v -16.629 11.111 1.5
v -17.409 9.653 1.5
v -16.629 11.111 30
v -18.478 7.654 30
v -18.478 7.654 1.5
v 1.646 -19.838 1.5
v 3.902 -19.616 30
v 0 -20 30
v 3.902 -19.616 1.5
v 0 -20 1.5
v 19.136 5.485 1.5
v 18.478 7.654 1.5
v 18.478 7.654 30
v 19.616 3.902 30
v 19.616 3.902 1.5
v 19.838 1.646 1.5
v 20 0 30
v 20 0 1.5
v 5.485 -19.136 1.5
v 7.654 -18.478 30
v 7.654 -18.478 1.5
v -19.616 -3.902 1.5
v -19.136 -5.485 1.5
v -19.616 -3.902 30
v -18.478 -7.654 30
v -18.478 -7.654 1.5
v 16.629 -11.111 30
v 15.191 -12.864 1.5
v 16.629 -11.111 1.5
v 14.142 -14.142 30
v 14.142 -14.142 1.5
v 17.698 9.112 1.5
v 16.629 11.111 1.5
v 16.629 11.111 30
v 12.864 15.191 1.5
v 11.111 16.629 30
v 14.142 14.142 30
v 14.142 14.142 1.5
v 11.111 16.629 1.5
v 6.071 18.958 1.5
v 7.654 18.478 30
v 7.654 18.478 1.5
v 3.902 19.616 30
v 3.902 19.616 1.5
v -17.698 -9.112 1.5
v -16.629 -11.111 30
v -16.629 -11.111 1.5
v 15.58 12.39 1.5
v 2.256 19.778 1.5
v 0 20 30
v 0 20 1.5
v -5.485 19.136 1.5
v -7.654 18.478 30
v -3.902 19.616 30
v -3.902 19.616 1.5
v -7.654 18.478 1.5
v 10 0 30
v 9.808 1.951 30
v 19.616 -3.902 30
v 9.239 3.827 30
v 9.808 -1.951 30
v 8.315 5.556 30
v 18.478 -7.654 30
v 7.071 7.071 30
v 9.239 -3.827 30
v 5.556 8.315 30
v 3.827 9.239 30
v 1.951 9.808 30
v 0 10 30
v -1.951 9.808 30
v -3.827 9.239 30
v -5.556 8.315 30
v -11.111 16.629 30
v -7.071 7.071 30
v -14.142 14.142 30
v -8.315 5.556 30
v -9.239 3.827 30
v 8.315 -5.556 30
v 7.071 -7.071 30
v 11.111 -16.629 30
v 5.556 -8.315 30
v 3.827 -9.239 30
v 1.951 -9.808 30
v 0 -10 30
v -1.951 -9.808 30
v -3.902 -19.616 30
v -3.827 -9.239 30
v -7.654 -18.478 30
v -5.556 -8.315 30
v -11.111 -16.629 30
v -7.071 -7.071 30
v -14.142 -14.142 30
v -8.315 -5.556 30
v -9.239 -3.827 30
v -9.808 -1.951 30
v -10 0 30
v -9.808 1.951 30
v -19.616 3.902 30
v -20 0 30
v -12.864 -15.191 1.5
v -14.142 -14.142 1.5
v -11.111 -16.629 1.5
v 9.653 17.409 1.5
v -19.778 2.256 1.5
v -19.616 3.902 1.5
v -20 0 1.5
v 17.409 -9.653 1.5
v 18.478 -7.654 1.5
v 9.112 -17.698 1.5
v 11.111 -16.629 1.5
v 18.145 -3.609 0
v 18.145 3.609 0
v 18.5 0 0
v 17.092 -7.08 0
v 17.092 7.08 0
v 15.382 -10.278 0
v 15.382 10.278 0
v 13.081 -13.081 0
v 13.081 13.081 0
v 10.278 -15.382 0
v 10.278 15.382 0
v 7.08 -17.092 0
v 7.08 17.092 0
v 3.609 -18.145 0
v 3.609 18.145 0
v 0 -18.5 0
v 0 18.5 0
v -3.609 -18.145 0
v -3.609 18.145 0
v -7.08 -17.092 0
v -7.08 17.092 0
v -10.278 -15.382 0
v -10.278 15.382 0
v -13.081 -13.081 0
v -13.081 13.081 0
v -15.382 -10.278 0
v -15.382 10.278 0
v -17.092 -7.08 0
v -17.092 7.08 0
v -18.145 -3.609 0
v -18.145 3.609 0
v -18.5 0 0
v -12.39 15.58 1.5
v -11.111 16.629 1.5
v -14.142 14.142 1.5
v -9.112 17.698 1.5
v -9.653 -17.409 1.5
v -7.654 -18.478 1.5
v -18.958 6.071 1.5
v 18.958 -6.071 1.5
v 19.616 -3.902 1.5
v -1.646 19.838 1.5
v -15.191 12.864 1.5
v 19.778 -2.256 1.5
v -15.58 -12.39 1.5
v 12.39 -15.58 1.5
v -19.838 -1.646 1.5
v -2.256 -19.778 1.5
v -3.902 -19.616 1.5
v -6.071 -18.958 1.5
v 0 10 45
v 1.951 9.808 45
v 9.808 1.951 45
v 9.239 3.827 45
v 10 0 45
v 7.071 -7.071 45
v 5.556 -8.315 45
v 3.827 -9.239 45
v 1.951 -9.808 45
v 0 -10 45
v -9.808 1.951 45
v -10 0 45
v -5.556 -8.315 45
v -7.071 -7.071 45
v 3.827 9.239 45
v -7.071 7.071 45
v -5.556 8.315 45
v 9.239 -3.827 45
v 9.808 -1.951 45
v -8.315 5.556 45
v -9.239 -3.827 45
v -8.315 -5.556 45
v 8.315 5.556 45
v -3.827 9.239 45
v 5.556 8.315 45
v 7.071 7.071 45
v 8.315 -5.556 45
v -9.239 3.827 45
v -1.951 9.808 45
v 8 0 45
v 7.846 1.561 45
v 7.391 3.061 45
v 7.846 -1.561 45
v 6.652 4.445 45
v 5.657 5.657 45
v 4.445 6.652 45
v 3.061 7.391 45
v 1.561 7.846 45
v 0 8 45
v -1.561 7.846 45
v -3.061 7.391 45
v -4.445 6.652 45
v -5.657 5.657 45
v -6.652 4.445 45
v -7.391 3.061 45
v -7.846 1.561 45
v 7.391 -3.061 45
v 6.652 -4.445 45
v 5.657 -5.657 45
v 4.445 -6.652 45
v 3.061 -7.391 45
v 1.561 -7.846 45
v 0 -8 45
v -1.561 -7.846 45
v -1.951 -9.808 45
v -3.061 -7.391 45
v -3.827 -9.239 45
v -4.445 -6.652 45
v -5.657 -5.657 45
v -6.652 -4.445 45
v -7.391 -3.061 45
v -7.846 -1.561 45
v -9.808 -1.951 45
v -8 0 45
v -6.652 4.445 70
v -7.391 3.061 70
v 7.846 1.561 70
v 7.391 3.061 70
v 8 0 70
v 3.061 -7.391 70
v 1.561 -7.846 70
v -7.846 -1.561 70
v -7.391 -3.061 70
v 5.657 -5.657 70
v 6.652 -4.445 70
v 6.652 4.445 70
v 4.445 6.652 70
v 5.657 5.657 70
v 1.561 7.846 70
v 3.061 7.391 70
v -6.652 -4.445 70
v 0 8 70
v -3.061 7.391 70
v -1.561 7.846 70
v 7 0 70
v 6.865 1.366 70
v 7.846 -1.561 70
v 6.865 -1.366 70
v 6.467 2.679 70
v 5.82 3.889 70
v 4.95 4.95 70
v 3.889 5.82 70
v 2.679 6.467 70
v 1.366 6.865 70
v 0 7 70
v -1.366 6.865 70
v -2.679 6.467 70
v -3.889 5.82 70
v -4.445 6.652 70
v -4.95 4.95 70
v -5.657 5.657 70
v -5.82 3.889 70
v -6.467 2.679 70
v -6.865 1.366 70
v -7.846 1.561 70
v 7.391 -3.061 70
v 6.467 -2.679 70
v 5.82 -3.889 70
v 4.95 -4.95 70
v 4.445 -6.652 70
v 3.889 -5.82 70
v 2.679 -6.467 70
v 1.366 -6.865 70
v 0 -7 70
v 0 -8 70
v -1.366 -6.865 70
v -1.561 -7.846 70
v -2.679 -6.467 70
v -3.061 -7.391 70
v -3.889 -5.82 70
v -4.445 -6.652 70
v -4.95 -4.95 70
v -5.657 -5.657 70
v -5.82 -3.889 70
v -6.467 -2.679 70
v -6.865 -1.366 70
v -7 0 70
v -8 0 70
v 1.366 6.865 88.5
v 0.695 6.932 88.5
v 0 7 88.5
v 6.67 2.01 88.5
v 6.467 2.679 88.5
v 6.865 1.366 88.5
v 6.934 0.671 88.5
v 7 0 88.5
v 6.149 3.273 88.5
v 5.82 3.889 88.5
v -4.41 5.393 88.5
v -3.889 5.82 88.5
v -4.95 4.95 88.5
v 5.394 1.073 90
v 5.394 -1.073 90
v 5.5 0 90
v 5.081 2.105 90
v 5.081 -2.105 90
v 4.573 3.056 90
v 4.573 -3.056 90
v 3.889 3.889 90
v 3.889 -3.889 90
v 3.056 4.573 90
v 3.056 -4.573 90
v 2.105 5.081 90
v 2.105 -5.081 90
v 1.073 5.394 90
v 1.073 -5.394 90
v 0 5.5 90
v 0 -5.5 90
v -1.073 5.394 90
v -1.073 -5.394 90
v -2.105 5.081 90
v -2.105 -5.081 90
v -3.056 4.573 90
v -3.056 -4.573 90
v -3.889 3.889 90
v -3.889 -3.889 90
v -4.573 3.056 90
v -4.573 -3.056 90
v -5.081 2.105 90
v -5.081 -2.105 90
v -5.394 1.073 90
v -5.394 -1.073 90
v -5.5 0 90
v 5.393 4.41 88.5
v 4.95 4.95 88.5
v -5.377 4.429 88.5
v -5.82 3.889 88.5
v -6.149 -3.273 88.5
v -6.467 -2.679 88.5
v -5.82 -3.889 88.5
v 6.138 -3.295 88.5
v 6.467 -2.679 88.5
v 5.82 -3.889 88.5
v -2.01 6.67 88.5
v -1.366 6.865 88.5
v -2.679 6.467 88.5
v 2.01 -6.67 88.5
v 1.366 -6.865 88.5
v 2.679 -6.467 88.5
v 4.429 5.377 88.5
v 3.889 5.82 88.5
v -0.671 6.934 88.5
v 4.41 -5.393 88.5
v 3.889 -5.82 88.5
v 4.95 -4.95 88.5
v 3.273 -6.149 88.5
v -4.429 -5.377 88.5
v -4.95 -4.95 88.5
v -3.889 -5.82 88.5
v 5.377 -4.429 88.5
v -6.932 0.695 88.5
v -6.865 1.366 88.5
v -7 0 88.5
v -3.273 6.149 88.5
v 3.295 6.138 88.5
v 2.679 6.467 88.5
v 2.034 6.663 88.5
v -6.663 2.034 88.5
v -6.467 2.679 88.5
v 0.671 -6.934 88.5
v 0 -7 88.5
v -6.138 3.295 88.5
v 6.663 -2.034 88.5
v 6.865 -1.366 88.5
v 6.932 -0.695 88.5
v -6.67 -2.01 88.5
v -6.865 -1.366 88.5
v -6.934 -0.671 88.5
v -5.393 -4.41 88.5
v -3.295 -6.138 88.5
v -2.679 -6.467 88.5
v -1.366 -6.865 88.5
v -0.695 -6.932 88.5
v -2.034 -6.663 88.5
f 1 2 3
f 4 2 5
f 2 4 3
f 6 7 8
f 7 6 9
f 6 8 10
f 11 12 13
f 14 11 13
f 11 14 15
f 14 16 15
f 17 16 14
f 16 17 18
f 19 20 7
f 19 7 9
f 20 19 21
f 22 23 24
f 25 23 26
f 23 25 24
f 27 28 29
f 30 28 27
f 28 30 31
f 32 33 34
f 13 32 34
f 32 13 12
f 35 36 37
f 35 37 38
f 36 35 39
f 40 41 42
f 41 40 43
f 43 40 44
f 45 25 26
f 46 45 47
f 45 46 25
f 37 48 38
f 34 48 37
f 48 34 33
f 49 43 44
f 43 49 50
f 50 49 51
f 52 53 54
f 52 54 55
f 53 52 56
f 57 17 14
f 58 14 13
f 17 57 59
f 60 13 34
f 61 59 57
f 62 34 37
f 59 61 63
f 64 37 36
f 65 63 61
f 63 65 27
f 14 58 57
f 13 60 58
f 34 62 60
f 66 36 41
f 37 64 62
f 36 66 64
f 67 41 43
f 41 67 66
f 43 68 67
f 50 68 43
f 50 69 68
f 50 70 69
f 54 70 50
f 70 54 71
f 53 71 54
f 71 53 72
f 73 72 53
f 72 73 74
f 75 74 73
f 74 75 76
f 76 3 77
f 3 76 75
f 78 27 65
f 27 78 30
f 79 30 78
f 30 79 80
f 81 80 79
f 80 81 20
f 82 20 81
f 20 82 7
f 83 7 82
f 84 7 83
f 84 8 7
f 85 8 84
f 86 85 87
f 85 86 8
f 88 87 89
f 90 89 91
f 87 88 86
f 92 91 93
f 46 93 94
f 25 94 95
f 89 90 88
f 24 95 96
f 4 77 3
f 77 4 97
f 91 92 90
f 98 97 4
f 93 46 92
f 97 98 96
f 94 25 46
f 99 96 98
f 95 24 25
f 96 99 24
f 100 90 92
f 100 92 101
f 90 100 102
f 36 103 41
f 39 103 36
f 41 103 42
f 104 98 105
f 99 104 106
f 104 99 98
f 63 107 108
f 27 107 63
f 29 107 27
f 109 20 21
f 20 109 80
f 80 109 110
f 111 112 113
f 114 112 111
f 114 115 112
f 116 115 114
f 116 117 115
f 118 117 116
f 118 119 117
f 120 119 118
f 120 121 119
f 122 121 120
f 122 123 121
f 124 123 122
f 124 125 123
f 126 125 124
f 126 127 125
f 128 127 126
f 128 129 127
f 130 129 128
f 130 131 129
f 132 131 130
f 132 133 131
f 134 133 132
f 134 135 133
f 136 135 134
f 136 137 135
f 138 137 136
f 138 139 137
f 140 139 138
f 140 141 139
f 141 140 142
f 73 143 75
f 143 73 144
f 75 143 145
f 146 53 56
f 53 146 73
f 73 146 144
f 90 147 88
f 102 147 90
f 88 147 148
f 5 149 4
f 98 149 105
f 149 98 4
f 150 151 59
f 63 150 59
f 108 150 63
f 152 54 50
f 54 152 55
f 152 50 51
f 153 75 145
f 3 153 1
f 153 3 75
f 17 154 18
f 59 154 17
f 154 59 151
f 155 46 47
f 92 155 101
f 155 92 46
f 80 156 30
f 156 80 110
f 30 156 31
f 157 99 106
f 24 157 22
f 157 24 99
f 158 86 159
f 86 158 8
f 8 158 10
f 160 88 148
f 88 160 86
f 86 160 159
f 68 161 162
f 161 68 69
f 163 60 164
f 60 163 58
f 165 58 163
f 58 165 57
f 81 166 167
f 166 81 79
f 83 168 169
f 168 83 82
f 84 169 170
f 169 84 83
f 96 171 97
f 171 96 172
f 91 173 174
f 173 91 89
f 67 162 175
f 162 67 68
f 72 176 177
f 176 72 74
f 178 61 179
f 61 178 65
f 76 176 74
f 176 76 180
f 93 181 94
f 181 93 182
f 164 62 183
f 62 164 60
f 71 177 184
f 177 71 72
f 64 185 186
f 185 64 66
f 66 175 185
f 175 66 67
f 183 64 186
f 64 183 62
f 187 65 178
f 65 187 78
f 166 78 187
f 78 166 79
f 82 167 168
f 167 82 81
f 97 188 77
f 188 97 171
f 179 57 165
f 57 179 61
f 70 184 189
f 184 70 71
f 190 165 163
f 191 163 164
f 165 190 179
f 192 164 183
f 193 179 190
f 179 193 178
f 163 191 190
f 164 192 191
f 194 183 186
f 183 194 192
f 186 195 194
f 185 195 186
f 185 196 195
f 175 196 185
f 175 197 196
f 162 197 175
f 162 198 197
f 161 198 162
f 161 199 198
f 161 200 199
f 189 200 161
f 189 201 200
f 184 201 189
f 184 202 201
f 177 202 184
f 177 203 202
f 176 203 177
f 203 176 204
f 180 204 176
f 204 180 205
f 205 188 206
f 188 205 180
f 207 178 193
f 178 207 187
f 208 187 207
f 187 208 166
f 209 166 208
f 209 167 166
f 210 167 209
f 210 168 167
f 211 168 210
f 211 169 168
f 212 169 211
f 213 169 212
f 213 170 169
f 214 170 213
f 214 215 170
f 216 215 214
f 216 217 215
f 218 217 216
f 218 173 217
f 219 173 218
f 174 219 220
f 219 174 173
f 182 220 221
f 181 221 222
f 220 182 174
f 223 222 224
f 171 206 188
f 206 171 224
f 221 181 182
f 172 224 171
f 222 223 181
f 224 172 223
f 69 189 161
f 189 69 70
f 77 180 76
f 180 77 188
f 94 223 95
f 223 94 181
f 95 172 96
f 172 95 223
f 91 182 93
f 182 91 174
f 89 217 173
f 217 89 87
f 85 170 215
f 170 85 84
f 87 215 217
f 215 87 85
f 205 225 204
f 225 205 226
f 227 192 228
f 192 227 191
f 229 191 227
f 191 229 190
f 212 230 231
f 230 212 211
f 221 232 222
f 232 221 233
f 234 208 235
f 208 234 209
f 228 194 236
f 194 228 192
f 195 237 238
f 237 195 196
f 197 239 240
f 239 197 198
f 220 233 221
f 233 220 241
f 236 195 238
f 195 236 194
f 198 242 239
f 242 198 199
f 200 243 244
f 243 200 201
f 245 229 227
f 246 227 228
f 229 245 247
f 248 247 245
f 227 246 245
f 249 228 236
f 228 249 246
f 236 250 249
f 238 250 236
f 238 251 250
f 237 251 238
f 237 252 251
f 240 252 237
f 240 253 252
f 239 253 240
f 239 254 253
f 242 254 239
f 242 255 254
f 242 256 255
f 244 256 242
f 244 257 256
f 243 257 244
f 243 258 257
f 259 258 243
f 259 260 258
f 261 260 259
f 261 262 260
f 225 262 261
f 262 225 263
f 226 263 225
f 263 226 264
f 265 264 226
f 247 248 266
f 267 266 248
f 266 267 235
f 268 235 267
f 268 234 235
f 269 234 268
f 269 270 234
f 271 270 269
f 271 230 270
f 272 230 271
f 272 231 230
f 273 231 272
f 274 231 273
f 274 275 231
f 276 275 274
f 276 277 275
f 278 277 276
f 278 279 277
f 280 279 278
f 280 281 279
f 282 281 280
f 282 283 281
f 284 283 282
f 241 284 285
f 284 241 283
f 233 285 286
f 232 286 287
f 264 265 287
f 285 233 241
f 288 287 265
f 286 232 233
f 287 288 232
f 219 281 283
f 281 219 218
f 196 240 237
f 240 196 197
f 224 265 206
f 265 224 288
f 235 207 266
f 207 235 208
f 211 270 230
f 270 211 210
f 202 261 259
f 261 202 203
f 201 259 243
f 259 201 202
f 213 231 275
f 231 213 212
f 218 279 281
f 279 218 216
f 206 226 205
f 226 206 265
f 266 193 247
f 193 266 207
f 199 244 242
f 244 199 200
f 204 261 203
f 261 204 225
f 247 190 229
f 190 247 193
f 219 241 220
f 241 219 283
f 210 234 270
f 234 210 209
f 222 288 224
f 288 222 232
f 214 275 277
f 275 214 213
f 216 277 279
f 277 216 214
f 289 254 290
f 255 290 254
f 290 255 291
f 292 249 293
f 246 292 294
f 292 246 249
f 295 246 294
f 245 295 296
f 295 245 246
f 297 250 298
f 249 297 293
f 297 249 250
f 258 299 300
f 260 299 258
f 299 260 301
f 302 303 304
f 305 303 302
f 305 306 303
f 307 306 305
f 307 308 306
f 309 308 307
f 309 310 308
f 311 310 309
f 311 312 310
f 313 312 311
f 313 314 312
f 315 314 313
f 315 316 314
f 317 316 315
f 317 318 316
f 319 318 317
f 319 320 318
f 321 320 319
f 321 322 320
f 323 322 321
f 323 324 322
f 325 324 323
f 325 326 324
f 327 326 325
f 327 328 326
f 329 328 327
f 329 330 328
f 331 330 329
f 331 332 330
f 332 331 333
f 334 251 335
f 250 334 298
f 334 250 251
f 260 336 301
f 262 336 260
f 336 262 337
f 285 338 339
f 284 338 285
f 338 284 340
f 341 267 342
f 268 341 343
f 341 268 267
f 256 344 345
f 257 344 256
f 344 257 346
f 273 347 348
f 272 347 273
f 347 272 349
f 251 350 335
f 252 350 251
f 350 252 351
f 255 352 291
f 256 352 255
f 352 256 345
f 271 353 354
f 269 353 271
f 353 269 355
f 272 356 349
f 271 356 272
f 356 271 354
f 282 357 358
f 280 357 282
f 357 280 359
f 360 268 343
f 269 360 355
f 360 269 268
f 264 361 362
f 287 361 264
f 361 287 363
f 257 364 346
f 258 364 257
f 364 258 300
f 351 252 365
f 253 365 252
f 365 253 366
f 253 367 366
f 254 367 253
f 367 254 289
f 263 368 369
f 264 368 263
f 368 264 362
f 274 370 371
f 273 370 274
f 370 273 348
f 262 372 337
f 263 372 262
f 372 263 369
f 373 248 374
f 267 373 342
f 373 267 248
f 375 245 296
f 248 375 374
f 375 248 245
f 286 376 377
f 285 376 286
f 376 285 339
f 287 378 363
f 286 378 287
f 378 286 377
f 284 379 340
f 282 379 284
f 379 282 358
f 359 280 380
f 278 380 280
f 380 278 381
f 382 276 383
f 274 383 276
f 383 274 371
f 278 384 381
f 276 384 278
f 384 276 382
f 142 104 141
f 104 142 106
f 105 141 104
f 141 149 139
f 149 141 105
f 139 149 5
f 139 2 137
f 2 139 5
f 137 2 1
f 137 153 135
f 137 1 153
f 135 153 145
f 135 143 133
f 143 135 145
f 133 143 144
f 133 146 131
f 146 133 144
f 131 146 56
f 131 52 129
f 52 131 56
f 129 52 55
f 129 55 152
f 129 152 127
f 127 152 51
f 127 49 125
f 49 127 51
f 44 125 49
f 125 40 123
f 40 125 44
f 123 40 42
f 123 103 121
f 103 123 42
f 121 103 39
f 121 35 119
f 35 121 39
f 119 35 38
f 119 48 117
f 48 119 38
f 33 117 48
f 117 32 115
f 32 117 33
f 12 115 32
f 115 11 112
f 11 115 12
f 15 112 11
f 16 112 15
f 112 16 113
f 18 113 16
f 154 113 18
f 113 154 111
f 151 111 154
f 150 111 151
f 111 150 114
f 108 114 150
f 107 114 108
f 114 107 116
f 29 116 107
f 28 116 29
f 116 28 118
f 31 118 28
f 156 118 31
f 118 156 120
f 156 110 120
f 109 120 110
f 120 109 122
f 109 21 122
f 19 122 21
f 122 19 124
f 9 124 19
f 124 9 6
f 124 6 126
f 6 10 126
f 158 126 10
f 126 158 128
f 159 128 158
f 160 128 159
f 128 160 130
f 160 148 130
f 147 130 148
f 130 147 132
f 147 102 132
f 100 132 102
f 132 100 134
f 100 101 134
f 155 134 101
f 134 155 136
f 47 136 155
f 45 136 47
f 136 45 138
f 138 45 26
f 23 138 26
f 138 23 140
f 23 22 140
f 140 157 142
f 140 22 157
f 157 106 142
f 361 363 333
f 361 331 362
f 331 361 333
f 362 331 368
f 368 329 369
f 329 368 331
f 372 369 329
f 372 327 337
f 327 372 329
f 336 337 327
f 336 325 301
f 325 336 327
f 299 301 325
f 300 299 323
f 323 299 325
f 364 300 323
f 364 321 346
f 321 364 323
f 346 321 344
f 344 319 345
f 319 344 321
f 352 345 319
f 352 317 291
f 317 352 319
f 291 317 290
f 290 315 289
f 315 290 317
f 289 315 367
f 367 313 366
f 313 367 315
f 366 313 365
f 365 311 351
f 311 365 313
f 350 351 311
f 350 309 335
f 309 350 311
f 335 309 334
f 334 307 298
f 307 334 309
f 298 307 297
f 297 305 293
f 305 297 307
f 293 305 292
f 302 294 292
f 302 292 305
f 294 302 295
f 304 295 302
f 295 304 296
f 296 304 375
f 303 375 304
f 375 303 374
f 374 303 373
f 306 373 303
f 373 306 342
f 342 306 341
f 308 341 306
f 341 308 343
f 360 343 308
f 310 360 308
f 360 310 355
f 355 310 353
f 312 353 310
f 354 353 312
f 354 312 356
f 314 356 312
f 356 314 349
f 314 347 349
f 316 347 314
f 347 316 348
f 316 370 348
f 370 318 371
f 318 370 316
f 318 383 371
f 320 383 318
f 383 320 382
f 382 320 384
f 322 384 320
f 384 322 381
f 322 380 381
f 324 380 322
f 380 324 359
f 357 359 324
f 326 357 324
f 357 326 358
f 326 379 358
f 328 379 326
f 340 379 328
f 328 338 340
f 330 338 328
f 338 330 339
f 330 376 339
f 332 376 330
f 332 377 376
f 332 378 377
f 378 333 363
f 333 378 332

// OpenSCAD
$fn = 32;

// ----------------------------------------------------------------------
// Stepped shaft: diameters 40, 20, 16, 14 mm, 90 mm long
// ----------------------------------------------------------------------

// --- parameters (mm) ---
d1 = 40;                  // step 1 diameter
len1 = 30;                // step 1 length
d2 = 20;                  // step 2 diameter
len2 = 15;                // step 2 length
d3 = 16;                  // step 3 diameter
len3 = 25;                // step 3 length
d4 = 14;                  // step 4 diameter
len4 = 20;                // step 4 length
total = 90;               // overall length
chamfer = 1.5;            // end chamfer

difference() {
  /* turned body: stacked cylinders, every step sunk into the bigger one */
  union() {
    cylinder(h = len1, d = d1);
    translate([0, 0, 29.6]) cylinder(h = 15.4, d = d2);
    translate([0, 0, 44.6]) cylinder(h = 25.4, d = d3);
    translate([0, 0, 69.6]) cylinder(h = 20.4, d = d4);
  }
  /* bottom chamfer ring cut */
  rotate_extrude() translate([18.5, -2.5]) polygon([[0, 0], [4, 0], [4, 6.5], [0, 2.5]]);
  /* top chamfer ring cut */
  rotate_extrude() translate([5.5, 90]) polygon([[0, 0], [4, -4], [4, 2.5], [0, 2.5]]);
}
